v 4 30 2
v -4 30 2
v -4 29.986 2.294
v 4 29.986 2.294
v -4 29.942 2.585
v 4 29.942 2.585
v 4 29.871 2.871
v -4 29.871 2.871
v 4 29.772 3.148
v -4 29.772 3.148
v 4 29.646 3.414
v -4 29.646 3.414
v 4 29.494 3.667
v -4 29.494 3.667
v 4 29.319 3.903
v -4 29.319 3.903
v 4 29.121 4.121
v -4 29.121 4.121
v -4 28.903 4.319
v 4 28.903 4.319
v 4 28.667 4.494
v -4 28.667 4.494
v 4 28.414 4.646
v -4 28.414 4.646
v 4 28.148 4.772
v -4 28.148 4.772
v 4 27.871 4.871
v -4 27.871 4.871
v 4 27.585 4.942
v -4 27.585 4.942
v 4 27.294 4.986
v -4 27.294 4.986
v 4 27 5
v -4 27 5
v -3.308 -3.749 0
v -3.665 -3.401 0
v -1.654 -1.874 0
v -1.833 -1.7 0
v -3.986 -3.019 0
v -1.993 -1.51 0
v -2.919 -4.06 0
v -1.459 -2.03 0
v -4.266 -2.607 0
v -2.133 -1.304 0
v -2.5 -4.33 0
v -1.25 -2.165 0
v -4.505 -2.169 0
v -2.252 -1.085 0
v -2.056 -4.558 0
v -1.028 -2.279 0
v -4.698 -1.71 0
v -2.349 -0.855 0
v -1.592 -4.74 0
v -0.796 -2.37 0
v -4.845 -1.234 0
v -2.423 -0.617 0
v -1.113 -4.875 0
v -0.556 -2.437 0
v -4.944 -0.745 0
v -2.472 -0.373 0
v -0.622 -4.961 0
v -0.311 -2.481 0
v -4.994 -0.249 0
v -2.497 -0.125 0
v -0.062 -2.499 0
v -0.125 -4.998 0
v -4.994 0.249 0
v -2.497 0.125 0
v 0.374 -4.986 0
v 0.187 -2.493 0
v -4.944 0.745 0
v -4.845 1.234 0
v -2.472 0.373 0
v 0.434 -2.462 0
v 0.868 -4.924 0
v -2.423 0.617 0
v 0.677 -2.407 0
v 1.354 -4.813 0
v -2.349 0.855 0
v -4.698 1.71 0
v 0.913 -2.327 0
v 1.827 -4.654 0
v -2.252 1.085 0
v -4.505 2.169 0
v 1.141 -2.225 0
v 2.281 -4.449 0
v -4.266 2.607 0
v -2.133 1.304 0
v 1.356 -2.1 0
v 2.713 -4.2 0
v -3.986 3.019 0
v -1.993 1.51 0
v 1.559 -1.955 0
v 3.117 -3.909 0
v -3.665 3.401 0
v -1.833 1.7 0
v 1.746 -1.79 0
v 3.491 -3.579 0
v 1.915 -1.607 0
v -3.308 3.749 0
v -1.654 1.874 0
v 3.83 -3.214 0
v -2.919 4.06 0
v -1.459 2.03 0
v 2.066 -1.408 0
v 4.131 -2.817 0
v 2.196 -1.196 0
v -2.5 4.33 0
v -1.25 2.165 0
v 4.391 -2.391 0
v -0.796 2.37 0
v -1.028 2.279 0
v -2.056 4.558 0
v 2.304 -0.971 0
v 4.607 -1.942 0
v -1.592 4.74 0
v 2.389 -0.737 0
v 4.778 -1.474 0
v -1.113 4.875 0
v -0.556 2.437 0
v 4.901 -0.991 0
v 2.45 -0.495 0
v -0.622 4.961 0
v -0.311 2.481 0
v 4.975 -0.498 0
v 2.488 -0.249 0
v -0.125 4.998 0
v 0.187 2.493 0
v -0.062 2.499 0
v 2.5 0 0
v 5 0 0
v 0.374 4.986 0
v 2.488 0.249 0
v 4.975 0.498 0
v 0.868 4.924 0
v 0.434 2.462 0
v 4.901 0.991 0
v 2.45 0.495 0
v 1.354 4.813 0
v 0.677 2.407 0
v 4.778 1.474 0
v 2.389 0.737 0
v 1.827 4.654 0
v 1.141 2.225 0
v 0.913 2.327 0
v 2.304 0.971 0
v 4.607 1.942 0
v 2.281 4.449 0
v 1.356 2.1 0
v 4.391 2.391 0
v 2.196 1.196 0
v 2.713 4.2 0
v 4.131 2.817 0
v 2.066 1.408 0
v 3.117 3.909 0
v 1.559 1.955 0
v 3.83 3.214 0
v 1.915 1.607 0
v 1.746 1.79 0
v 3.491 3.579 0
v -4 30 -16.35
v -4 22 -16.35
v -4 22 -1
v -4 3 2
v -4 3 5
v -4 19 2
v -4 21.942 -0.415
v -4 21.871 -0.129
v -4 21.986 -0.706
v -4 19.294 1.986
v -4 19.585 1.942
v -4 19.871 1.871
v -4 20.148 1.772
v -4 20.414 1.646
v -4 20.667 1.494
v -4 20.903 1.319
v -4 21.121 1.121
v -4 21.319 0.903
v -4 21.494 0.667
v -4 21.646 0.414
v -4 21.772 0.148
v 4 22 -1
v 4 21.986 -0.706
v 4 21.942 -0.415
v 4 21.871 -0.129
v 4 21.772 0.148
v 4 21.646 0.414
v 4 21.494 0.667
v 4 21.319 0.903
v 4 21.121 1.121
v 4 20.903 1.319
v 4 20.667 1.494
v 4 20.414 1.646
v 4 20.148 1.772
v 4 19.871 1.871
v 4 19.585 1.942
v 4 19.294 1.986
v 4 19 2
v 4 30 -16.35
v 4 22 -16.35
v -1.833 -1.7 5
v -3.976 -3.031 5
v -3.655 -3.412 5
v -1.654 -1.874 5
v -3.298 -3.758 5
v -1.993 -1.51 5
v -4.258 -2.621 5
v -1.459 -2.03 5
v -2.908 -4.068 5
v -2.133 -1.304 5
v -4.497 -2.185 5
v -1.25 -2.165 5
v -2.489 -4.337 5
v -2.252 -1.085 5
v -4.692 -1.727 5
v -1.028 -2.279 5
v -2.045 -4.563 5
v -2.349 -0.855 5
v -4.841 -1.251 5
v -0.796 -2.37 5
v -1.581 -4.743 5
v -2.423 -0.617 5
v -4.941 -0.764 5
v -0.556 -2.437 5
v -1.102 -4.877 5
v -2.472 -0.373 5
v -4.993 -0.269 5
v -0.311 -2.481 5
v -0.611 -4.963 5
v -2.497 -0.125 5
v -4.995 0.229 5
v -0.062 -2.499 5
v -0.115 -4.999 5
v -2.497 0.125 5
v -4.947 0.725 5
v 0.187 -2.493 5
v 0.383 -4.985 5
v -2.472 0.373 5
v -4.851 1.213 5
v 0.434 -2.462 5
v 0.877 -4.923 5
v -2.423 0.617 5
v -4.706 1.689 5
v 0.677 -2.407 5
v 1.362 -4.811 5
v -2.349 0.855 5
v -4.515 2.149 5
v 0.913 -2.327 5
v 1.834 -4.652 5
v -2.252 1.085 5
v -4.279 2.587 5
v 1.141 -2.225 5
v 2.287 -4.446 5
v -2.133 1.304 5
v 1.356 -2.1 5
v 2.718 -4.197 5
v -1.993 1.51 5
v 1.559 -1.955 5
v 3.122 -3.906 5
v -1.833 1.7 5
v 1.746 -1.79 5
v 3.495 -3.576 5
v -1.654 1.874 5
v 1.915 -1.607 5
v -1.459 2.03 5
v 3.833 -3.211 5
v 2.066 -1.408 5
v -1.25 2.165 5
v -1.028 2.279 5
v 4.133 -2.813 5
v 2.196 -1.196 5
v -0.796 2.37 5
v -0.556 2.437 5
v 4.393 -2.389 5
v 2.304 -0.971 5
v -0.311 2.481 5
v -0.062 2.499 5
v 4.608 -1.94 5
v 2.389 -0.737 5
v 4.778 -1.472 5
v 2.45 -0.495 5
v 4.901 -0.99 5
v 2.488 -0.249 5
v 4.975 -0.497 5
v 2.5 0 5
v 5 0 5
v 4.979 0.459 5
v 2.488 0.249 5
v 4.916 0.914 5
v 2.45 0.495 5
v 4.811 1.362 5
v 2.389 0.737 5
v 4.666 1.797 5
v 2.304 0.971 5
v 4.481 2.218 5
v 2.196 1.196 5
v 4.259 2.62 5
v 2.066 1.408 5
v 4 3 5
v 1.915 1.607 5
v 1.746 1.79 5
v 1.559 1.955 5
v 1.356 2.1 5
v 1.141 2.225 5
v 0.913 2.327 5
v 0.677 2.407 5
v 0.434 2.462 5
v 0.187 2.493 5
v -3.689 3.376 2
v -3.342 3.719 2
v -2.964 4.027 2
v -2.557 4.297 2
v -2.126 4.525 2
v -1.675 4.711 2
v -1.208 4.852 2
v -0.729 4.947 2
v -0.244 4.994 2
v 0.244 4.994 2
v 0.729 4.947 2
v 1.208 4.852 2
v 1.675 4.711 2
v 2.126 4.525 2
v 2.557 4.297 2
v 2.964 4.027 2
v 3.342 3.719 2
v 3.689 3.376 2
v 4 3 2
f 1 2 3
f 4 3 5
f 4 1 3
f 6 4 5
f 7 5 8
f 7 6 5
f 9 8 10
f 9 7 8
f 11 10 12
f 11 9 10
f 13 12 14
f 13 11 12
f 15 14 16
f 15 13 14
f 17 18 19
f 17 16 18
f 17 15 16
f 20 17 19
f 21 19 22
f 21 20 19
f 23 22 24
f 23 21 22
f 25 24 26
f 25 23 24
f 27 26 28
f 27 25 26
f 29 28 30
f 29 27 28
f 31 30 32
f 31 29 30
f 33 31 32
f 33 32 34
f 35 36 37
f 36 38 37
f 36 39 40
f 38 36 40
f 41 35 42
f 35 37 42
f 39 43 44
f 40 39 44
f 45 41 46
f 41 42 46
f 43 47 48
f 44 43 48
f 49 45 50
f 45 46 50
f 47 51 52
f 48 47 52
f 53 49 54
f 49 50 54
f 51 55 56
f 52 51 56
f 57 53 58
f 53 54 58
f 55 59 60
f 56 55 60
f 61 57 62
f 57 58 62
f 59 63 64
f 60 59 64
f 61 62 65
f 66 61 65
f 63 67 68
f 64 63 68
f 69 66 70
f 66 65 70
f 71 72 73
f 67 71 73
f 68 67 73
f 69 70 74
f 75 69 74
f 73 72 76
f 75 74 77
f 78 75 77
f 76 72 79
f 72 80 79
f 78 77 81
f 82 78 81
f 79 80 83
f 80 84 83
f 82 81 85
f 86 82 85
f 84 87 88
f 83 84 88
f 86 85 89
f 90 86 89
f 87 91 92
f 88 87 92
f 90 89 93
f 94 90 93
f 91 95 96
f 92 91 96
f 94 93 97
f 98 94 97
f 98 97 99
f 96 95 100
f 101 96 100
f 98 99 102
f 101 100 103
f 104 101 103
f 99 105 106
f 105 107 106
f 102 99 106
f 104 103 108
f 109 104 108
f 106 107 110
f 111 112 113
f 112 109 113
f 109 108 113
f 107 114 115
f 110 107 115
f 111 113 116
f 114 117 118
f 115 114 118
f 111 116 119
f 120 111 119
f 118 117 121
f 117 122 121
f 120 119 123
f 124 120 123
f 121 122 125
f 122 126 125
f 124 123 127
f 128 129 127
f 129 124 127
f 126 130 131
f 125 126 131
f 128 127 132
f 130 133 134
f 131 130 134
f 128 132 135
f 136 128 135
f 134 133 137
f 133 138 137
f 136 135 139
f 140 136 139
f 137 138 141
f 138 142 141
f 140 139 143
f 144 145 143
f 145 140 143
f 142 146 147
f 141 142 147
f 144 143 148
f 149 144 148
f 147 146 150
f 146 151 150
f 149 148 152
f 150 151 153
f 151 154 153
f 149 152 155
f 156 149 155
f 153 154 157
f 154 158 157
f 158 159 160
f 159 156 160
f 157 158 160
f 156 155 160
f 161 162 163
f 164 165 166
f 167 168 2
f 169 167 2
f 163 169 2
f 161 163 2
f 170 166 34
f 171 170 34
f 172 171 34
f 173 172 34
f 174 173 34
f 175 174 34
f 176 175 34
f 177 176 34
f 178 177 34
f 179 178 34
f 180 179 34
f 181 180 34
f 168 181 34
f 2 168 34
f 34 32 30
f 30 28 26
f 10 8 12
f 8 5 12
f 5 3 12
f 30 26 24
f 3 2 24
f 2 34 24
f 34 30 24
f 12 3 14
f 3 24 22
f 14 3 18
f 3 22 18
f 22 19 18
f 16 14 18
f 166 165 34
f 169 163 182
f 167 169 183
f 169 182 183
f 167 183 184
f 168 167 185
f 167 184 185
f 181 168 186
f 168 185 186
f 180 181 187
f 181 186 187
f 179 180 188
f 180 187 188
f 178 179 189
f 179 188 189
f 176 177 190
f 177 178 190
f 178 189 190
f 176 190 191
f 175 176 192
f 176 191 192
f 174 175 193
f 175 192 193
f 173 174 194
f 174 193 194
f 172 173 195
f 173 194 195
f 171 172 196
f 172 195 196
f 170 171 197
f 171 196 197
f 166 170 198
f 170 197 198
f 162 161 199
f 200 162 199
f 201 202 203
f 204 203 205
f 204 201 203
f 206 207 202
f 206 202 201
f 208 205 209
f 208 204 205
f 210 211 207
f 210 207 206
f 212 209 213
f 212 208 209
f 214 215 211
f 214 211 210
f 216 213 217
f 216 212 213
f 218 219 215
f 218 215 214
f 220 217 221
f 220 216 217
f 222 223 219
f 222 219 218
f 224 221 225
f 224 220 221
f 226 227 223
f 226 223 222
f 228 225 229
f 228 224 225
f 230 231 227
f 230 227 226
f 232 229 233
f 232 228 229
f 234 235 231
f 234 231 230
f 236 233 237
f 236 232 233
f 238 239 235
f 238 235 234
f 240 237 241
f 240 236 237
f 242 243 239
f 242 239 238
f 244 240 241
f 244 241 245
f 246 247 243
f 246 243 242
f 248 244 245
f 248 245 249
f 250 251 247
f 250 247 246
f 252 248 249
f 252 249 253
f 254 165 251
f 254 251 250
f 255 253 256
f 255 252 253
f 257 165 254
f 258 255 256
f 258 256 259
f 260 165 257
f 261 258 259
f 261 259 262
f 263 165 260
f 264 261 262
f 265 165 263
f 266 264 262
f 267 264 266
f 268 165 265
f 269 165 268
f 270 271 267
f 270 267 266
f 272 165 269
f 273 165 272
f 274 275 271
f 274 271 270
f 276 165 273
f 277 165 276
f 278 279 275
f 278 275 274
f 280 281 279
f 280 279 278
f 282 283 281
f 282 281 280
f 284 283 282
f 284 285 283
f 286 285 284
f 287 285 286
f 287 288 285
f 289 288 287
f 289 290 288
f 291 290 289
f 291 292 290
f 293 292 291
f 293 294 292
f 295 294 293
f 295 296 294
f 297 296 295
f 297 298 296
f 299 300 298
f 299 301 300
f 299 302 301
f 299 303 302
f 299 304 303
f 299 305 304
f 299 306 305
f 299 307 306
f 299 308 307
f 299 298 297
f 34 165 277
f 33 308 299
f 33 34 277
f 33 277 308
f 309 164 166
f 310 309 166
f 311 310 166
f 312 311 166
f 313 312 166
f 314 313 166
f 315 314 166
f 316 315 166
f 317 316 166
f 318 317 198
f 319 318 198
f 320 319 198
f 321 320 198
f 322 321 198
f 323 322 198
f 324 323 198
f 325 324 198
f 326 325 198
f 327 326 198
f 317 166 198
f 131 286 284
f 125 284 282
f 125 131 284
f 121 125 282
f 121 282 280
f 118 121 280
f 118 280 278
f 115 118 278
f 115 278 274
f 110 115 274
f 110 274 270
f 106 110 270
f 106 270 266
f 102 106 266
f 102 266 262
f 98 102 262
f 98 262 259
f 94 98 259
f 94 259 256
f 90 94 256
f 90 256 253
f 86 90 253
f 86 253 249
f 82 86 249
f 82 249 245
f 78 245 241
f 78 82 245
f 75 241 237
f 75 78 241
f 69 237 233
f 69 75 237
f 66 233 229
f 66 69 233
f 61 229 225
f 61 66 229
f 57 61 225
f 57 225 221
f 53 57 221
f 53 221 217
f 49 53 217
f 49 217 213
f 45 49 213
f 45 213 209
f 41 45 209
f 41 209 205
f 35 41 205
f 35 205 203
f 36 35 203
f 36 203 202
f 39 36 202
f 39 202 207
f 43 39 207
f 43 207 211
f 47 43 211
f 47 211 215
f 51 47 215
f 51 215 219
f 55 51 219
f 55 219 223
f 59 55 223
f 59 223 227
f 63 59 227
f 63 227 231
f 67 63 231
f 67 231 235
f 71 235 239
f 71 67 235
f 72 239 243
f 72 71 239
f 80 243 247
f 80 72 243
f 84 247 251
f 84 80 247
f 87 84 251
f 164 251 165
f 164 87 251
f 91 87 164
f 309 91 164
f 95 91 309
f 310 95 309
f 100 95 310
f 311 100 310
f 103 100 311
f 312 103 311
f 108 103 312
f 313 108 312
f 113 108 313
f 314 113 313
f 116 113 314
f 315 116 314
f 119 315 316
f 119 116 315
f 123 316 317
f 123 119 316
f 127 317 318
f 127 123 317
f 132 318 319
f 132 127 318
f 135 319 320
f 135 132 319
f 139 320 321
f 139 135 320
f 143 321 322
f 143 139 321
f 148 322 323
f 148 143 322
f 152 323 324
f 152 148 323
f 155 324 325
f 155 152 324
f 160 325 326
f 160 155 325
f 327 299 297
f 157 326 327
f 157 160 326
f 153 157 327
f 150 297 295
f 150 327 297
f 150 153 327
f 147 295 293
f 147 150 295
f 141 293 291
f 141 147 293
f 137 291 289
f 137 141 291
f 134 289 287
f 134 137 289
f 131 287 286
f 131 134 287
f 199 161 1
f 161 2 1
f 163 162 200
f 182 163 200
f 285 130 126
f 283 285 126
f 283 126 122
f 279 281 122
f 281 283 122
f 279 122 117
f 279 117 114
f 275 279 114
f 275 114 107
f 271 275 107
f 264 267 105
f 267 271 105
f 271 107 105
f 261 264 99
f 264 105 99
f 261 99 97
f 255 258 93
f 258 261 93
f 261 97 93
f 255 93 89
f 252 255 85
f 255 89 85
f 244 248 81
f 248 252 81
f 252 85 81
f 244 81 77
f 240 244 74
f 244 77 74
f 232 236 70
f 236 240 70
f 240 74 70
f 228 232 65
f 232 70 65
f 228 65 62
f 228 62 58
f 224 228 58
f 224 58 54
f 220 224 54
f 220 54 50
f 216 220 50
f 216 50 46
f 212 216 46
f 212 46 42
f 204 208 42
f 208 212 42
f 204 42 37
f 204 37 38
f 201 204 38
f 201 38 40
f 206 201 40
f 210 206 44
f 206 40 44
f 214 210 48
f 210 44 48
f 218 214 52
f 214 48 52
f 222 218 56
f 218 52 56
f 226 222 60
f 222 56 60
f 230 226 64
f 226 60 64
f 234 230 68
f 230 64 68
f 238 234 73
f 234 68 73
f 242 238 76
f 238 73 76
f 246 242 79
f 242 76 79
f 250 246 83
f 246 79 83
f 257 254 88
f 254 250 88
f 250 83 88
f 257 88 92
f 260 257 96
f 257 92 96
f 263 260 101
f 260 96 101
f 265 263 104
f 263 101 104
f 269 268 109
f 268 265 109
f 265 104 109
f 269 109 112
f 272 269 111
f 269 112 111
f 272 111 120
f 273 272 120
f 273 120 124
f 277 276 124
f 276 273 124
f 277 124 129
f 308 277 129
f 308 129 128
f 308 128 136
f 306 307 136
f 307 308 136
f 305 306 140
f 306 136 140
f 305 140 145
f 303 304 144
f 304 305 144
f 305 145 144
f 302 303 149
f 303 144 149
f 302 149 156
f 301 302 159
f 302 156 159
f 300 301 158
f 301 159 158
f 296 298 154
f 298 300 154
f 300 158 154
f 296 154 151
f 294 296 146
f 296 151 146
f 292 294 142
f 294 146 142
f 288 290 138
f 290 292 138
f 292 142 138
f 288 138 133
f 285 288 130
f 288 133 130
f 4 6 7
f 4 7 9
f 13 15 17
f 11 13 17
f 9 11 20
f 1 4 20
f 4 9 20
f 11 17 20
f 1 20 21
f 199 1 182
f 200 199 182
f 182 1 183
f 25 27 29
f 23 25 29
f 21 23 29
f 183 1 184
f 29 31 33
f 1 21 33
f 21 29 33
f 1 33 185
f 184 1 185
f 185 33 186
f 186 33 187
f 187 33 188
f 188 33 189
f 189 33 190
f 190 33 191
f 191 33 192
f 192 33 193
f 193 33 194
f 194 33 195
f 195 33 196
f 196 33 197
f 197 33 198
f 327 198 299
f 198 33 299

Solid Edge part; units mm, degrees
sketch "Sketch1" plane through (0, 0, 0) normal (0, 0, 1) x (1, 0, 0)
  circle A0 centre (0, 0) radius 2.5
  circle A1 centre (0, 0) radius 5
  dimension "D1" = 5
  dimension "D2" = 10
extrude "Protrusion1" add sketch "Sketch1" along normal blind 5
sketch "Sketch2" plane through (0, 0, 5) normal (0, 0, 1) x (1, 0, 0)
  line L0 (-4, 3) -> (4, 3)
  line L1 (4, 30) -> (4, 3)
  line L2 (-4, 30) -> (4, 30)
  line L3 (-4, 3) -> (-4, 30)
  dimension "D1" = 8
  dimension "D2" = 30
extrude "ExtrudedProtrusion_2" add sketch "Sketch2" against normal blind 3
sketch "Sketch3" plane through (0, 16.5, 2) normal (0, 0, -1) x (0, 1, 0)
  line L0 (13.5, 4) -> (13.5, -4)
  line L1 (13.5, -4) -> (5.5, -4)
  line L2 (5.5, -4) -> (5.5, 4)
  line L3 (5.5, 4) -> (13.5, 4)
  dimension "D1" = 8
extrude "ExtrudedProtrusion_3" add sketch "Sketch3" along normal blind 18.35
fillet "Round1" radius 3 2 edges at (0, 22, 2) (0, 30, 5)
properties material "Polyethylene, low density"
